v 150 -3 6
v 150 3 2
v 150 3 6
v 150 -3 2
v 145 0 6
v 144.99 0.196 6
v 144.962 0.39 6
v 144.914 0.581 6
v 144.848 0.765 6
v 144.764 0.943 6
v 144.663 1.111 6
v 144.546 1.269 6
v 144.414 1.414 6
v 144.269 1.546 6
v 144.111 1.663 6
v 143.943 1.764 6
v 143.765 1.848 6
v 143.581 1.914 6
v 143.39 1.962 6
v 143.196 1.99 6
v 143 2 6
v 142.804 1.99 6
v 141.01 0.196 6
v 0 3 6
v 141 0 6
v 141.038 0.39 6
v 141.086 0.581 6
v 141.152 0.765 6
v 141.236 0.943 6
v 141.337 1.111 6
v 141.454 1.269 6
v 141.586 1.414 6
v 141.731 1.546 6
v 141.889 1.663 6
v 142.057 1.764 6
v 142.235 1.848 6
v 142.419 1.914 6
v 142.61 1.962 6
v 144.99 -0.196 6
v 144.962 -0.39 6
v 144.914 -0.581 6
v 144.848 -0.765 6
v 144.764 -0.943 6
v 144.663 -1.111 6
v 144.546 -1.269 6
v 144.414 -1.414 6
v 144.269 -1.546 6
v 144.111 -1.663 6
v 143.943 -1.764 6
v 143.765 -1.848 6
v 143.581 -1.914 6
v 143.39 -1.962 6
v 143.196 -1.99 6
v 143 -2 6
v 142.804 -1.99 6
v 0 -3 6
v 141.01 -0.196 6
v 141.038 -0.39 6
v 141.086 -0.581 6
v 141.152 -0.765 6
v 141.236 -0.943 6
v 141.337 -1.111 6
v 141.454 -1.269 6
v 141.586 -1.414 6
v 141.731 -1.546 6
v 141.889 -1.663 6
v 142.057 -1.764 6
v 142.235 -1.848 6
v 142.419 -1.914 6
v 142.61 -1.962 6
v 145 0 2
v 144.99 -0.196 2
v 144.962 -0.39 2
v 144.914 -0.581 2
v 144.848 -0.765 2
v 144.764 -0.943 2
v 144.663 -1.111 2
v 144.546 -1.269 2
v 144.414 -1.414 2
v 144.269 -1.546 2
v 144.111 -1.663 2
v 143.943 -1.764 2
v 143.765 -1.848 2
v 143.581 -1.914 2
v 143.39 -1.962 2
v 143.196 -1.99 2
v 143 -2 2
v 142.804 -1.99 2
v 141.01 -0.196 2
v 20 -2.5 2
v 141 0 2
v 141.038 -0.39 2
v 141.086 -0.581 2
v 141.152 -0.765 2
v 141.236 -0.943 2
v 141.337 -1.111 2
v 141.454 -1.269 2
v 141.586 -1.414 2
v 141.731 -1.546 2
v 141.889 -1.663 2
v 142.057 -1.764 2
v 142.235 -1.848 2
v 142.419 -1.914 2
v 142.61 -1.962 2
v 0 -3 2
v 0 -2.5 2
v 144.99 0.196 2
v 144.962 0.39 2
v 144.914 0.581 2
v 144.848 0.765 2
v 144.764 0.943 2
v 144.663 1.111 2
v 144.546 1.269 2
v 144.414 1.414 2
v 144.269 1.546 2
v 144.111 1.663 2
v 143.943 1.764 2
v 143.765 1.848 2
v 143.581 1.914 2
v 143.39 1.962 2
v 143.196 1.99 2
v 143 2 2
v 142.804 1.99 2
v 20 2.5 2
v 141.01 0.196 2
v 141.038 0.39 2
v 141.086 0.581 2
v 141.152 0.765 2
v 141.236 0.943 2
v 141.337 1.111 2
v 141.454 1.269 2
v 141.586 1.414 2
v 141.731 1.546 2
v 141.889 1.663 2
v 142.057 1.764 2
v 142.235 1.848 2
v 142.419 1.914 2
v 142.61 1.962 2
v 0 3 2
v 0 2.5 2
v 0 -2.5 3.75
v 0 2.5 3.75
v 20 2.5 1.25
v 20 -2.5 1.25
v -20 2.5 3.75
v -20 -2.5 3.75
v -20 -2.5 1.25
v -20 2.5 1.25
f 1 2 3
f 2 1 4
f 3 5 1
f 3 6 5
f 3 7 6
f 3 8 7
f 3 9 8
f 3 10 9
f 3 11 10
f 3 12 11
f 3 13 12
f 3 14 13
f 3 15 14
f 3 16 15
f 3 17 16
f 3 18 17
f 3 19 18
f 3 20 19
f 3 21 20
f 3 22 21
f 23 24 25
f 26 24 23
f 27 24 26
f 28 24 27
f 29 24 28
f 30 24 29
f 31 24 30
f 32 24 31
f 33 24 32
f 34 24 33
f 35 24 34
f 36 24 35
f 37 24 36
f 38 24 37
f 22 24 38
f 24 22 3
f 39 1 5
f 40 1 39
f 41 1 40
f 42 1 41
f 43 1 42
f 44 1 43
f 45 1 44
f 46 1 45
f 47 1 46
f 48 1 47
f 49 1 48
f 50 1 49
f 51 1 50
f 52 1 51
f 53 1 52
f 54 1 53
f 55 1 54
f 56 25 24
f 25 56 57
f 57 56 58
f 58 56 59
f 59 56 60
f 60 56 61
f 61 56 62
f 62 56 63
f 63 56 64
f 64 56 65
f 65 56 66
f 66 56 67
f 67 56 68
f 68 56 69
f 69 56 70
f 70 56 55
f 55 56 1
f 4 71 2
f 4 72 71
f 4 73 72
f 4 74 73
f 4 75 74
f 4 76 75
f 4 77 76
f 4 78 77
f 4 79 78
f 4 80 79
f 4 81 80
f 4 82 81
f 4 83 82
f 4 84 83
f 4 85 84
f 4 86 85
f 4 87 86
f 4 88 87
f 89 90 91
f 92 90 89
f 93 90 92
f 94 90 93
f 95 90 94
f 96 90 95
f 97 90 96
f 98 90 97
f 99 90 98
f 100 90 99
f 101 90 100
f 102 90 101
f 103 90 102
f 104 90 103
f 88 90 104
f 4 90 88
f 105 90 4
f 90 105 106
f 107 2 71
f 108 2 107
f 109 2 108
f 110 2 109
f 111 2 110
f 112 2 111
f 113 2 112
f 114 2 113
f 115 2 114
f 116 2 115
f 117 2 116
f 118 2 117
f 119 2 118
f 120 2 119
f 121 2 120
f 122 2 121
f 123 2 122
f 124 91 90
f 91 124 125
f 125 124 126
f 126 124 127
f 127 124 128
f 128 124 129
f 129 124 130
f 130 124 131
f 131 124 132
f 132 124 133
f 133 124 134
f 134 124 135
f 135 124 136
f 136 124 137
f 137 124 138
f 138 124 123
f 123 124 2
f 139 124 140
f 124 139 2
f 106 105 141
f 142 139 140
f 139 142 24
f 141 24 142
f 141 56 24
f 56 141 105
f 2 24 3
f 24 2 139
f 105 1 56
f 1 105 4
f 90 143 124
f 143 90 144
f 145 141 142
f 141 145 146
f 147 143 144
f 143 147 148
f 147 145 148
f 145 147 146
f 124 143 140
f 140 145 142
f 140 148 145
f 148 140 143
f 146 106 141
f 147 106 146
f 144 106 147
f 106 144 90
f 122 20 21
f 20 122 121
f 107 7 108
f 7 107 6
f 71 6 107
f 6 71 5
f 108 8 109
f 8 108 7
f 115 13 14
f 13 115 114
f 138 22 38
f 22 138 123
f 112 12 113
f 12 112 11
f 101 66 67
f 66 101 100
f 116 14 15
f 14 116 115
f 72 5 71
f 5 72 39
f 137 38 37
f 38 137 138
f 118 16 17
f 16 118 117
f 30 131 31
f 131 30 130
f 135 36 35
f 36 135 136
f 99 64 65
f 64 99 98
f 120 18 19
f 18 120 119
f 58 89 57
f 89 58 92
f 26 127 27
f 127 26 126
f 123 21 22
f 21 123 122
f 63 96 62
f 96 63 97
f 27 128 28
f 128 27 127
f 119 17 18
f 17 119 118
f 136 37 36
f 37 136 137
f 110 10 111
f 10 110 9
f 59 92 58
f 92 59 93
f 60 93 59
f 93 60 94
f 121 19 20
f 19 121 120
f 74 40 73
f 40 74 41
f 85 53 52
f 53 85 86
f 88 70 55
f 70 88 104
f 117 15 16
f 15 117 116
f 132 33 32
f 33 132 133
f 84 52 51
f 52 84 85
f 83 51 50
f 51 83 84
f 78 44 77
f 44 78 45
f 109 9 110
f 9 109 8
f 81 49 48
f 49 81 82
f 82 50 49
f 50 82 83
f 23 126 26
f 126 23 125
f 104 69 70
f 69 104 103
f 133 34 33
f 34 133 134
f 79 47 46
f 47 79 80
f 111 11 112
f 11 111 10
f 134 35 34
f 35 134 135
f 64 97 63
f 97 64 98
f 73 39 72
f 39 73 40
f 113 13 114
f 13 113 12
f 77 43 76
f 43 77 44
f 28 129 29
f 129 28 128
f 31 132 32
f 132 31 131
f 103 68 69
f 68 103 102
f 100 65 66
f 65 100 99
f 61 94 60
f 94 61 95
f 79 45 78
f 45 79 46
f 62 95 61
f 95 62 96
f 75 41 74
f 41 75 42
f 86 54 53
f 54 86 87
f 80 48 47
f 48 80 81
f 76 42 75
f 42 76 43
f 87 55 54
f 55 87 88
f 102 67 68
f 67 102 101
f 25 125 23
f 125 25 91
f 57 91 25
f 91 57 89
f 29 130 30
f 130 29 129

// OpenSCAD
// Built by bench/smallmodels/features/compiler.py from a list of features.
$fn = 64;
difference() {
  union() {
    translate([75, 0, 2]) translate([-75, -3, 0]) cube([150, 6, 4]);
    translate([0, 0, 1.25]) translate([-20, -2.5, 0]) cube([40, 5, 2.5]);
  }
  union() {
    translate([143, 0, 1.99]) rotate([0, 0, 0]) cylinder(d = 4, h = 4.02);
  }
}
